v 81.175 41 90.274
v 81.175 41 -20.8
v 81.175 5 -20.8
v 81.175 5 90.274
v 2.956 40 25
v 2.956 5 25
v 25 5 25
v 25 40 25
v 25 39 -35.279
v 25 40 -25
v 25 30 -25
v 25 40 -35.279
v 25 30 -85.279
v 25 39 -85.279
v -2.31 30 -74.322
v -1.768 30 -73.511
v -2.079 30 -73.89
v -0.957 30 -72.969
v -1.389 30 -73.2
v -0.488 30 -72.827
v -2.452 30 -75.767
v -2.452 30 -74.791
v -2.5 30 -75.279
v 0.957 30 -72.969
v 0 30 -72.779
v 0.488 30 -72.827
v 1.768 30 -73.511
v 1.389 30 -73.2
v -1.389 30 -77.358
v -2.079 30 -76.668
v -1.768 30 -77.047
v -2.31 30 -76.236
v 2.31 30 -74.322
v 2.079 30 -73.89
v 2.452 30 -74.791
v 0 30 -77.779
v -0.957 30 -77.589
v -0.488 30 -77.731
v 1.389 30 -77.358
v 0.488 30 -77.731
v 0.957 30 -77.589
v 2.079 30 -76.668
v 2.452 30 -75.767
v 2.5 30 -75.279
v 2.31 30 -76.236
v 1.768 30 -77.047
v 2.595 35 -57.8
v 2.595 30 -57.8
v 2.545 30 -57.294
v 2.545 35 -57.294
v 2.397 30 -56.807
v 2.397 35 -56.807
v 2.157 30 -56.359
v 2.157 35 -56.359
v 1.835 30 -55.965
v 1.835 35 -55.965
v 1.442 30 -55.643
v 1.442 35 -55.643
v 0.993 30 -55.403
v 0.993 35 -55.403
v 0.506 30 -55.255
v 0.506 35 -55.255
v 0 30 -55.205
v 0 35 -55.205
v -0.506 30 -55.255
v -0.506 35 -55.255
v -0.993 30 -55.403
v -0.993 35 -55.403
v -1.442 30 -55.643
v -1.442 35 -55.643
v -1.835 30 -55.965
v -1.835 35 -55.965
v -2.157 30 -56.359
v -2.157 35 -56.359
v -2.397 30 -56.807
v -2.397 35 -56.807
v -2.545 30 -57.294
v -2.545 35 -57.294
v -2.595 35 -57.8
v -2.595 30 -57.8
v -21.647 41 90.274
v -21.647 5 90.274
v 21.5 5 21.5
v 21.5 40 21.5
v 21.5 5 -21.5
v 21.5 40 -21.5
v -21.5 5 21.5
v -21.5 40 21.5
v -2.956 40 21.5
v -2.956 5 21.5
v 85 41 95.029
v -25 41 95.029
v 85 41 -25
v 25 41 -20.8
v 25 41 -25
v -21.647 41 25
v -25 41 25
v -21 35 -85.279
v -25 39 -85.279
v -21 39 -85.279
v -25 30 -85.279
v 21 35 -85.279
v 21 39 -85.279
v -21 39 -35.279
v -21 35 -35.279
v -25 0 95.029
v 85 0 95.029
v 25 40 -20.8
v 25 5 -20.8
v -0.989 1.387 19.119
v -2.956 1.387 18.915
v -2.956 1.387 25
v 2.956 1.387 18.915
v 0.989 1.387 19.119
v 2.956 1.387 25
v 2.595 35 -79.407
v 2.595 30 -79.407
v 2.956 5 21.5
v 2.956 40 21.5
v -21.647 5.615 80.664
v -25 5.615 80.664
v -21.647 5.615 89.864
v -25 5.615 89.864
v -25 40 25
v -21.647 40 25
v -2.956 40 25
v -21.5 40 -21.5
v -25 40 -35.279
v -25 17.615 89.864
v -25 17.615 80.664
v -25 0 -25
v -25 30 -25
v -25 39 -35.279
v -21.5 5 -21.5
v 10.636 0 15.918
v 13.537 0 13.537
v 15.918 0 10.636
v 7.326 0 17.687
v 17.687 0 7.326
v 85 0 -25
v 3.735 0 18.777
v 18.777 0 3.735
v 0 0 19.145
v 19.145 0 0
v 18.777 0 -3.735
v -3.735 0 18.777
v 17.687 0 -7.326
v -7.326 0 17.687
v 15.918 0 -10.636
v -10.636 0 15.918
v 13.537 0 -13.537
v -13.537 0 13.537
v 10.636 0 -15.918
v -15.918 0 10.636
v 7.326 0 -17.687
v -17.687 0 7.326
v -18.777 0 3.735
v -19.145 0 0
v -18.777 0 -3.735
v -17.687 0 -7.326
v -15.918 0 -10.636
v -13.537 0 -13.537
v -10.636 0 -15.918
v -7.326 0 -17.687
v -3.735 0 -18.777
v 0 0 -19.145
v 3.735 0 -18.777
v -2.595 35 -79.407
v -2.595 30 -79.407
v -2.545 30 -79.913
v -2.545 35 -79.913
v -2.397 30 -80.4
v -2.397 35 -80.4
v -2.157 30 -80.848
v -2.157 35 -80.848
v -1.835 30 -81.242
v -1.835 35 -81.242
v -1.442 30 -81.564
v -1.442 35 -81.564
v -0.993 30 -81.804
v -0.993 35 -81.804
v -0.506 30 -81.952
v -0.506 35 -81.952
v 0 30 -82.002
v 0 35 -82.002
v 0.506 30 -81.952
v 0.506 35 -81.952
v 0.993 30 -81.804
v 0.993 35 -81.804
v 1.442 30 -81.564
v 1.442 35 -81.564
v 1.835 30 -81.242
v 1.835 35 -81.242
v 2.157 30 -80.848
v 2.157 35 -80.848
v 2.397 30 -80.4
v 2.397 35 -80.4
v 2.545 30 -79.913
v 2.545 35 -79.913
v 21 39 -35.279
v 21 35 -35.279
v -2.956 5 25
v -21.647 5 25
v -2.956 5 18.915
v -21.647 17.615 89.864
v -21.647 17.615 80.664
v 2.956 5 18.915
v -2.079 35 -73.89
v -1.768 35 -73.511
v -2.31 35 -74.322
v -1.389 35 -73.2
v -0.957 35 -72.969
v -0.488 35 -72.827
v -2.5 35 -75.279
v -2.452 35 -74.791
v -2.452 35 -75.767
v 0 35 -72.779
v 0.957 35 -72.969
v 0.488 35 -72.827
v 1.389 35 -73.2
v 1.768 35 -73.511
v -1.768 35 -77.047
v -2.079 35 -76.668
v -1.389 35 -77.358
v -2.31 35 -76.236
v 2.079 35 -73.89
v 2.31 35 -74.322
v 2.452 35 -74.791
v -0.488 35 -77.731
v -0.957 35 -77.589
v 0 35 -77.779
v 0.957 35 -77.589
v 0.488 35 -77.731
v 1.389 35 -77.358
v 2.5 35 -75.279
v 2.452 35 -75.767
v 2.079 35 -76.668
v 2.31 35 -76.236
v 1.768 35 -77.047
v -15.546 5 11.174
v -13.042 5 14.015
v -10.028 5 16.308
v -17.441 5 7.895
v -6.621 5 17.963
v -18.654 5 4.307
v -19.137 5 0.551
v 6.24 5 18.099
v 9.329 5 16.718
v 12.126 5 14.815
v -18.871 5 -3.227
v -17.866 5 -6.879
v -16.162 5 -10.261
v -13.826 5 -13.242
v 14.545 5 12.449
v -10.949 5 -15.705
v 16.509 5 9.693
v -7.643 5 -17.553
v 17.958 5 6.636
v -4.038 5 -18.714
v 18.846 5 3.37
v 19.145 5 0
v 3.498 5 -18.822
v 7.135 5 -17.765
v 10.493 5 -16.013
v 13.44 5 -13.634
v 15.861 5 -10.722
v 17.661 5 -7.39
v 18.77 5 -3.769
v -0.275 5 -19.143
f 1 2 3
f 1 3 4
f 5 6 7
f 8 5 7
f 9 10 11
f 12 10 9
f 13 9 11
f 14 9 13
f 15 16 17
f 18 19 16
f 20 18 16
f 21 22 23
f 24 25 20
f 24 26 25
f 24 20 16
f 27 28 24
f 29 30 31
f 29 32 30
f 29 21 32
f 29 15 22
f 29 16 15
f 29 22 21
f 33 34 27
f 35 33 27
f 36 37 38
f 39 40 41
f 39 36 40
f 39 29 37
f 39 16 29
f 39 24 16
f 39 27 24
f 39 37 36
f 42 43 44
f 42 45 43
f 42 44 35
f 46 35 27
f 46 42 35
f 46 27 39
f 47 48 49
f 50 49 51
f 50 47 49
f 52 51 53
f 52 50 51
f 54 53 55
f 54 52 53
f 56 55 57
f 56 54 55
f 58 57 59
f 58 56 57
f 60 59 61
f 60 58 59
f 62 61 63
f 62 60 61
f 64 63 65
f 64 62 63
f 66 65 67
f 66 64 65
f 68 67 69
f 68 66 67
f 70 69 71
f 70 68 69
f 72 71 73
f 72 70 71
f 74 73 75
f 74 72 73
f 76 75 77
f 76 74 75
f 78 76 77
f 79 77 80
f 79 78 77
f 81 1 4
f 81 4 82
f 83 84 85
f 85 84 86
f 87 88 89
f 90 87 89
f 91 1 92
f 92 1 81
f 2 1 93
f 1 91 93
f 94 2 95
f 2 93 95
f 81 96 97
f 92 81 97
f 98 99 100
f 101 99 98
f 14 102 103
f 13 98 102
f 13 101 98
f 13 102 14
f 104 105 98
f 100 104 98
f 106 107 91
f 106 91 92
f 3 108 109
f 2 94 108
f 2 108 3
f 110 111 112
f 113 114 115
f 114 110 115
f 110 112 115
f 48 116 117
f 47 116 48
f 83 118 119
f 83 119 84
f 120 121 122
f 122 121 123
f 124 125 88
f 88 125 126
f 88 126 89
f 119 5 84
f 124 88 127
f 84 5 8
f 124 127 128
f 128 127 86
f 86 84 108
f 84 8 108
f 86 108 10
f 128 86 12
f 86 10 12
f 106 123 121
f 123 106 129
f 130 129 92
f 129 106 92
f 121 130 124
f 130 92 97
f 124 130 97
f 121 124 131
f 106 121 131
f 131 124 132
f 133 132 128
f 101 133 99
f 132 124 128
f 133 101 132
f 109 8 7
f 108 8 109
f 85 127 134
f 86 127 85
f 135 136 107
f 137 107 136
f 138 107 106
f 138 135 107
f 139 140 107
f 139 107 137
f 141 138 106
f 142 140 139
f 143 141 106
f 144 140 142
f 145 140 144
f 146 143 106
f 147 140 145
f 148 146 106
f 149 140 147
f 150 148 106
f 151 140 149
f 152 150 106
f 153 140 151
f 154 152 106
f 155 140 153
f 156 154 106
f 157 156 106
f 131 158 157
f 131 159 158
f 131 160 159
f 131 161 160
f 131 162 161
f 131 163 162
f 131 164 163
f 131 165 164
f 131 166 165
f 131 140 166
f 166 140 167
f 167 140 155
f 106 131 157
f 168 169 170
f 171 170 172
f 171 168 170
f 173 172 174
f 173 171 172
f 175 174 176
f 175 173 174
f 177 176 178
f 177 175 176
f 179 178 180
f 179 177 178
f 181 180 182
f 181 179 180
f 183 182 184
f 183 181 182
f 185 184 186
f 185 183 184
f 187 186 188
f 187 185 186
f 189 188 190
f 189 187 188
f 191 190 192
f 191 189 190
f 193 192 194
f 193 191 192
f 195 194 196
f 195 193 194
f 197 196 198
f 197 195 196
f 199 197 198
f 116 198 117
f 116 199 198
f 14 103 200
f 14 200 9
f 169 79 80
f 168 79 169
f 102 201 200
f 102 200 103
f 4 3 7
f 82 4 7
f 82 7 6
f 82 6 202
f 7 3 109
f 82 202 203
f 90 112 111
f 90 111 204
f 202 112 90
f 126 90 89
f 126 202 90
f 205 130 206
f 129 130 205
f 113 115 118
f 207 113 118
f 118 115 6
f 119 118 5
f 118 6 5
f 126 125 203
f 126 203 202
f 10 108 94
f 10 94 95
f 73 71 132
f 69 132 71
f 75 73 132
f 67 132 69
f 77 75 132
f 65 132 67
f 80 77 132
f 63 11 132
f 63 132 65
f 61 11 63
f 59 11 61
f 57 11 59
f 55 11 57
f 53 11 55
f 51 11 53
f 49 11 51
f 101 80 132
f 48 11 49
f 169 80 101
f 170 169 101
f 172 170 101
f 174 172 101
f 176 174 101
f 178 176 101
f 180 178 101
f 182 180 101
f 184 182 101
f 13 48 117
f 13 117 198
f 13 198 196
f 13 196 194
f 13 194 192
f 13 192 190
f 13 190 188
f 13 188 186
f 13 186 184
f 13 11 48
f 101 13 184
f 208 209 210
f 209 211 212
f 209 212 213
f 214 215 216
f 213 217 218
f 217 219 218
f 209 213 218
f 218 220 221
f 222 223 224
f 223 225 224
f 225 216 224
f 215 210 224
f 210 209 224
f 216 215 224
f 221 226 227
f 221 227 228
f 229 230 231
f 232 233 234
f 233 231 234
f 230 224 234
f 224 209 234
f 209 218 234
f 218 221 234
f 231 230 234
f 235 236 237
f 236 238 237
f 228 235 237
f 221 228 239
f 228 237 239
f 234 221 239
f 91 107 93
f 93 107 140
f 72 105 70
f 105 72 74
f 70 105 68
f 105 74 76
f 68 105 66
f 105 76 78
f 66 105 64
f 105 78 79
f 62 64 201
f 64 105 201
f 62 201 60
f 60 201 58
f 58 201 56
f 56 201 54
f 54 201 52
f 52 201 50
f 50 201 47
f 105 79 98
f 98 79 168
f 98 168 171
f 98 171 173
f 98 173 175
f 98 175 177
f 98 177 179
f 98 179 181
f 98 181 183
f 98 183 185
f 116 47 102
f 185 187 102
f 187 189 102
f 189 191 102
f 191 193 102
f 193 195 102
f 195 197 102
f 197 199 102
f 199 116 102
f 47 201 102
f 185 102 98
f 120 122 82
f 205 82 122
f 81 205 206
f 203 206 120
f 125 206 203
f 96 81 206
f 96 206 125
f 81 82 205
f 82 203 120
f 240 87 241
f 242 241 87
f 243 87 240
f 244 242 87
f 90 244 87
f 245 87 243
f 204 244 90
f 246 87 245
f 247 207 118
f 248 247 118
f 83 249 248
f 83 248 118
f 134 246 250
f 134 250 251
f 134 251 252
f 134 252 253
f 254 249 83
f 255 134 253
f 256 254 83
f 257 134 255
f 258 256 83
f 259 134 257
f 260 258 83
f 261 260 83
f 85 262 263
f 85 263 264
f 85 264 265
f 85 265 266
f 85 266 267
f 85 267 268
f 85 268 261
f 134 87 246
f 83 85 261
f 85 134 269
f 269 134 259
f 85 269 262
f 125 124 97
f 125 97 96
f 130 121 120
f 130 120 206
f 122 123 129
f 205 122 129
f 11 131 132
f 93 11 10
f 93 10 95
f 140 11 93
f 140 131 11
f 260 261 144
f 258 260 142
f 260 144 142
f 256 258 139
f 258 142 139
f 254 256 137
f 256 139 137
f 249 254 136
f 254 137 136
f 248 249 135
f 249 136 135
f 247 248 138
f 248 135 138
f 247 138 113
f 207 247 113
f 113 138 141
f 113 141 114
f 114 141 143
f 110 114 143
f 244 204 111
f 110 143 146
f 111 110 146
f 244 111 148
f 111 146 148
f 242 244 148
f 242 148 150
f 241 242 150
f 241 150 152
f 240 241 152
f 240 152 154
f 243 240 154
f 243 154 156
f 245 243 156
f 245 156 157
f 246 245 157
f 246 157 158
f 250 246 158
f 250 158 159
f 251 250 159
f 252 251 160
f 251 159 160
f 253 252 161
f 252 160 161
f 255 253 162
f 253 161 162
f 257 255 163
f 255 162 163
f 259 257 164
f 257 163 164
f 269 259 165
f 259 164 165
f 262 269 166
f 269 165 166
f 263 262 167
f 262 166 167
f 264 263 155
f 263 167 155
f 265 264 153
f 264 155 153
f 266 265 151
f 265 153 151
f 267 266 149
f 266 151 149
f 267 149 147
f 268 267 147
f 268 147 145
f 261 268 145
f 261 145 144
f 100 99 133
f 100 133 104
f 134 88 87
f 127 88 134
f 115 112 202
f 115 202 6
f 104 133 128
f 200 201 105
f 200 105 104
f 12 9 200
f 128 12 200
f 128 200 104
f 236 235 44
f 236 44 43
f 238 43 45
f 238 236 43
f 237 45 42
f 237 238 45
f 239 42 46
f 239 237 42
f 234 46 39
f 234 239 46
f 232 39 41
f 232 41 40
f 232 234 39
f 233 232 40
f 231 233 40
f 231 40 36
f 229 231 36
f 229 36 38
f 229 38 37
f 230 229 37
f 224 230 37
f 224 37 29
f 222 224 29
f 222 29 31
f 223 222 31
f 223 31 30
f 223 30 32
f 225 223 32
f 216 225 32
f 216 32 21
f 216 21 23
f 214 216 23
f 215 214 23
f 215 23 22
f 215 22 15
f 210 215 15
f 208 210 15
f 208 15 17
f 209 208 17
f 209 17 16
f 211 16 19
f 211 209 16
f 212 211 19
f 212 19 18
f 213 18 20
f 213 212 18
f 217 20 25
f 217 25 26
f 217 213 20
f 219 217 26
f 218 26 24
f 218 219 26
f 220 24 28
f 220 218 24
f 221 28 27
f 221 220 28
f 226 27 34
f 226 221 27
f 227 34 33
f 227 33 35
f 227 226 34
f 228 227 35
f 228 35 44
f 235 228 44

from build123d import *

# Parameters (mm, degrees)
CROQUIS1_W                   = 50
CROQUIS1_H                   = 50
SALIENTE_EXTRUIR1_DEPTH      = 40
CROQUIS3_W                   = 43
CROQUIS3_H                   = 43
CORTAR_EXTRUIR3_DEPTH        = 35
CROQUIS5_W                   = 10.279142756
CROQUIS5_H                   = 10
SALIENTE_EXTRUIR2_DEPTH      = 25
SALIENTE_EXTRUIR2_DEPTH_BACK = 25
CROQUIS6_W                   = 50
CROQUIS6_H                   = 5
SALIENTE_EXTRUIR3_DEPTH      = 25
SALIENTE_EXTRUIR3_DEPTH_BACK = 25
CROQUIS7_W                   = 4
CROQUIS7_H                   = 50
SALIENTE_EXTRUIR4_DEPTH      = 4
CROQUIS8_R                   = 2.5
CORTAR_EXTRUIR5_DEPTH        = 4
CORTAR_EXTRUIR5_DEPTH_BACK   = 24
CROQUIS12_W                  = 5.911432894
CROQUIS12_H                  = 39.020469491
CORTAR_EXTRUIR7_DEPTH        = 10
CROQUIS13_R                  = 19.144660632
CORTAR_EXTRUIR8_DEPTH        = 10
SALIENTE_EXTRUIR6_DEPTH      = 41
CORTAR_EXTRUIR9_DEPTH        = 36
CROQUIS16_W                  = 9.2
CROQUIS16_H                  = 12
CORTAR_EXTRUIR10_DEPTH       = 36


with BuildPart() as part:
    # Croquis1 → Saliente-Extruir1 (new body)
    with BuildSketch(Plane(origin=(0, 0, 0), x_dir=(1, 0, 0), z_dir=(0, 1, 0))):
        Rectangle(CROQUIS1_W, CROQUIS1_H)
    extrude(amount=SALIENTE_EXTRUIR1_DEPTH)

    # Croquis3 → Cortar-Extruir3 (cut)
    with BuildSketch(Plane(origin=(0, 40, 0), x_dir=(1, 0, 0), z_dir=(0, 1, 0))):
        Rectangle(CROQUIS3_W, CROQUIS3_H)
    extrude(amount=-CORTAR_EXTRUIR3_DEPTH, mode=Mode.SUBTRACT)

    # Croquis5 → Saliente-Extruir2 (add, two sides)
    with BuildSketch(Plane(origin=(0, 0, 0), x_dir=(0, 0, -1), z_dir=(1, 0, 0))) as saliente_extruir2_sk:
        with Locations((30.139571378, 35)):
            Rectangle(CROQUIS5_W, CROQUIS5_H)
    extrude(amount=SALIENTE_EXTRUIR2_DEPTH)
    extrude(saliente_extruir2_sk.sketch, amount=-SALIENTE_EXTRUIR2_DEPTH_BACK)

    # Croquis6 → Saliente-Extruir3 (add, two sides)
    with BuildSketch(Plane(origin=(0, 0, 0), x_dir=(0, 0, -1), z_dir=(1, 0, 0))) as saliente_extruir3_sk:
        with Locations((60.279142756, 32.5)):
            Rectangle(CROQUIS6_W, CROQUIS6_H)
    extrude(amount=SALIENTE_EXTRUIR3_DEPTH)
    extrude(saliente_extruir3_sk.sketch, amount=-SALIENTE_EXTRUIR3_DEPTH_BACK)

    # Croquis7 → Saliente-Extruir4 (add)
    with BuildSketch(Plane(origin=(0, 35, 0), x_dir=(1, 0, 0), z_dir=(0, 1, 0))):
        with Locations((23, 60.279142756)):
            Rectangle(CROQUIS7_W, CROQUIS7_H)
        with Locations((-23, 60.279142756)):
            Rectangle(CROQUIS7_W, CROQUIS7_H)
    extrude(amount=SALIENTE_EXTRUIR4_DEPTH)

    # Croquis8 → Cortar-Extruir5 (cut, two sides)
    with BuildSketch(Plane(origin=(0, 35, 0), x_dir=(1, 0, 0), z_dir=(0, 1, 0))) as cortar_extruir5_sk:
        with BuildLine():
            Line((2.594795299, 79.406752636), (2.594795299, 57.800113609))
            ThreePointArc((2.594795299, 57.800113609), (0, 55.20531831), (-2.594795299, 57.800113609))
            Line((-2.594795299, 57.800113609), (-2.594795299, 79.406752636))
            ThreePointArc((-2.594795299, 79.406752636), (0, 82.001547935), (2.594795299, 79.406752636))
        make_face()
        with Locations((0, 75.279142756)):
            Circle(CROQUIS8_R, mode=Mode.SUBTRACT)
    extrude(amount=CORTAR_EXTRUIR5_DEPTH, mode=Mode.SUBTRACT)
    extrude(cortar_extruir5_sk.sketch, amount=-CORTAR_EXTRUIR5_DEPTH_BACK, mode=Mode.SUBTRACT)

    # Croquis12 → Cortar-Extruir7 (cut)
    with BuildSketch(Plane.XY.offset(25)):
        with Locations((0, 20.897214315)):
            Rectangle(CROQUIS12_W, CROQUIS12_H)
    extrude(amount=-CORTAR_EXTRUIR7_DEPTH, mode=Mode.SUBTRACT)

    # Croquis13 → Cortar-Extruir8 (cut)
    with BuildSketch(Plane.XZ):
        Circle(CROQUIS13_R)
    extrude(amount=-CORTAR_EXTRUIR8_DEPTH, mode=Mode.SUBTRACT)

    # Croquis14 → Saliente-Extruir6 (add)
    with BuildSketch(Plane(origin=(0, 0, 0), x_dir=(1, 0, 0), z_dir=(0, 1, 0))):
        Polygon((25, -25), (25, 25), (85, 25), (85, -25), (85, -95.028675022), (-25, -95.028675022), (-25, -25), align=None)
    extrude(amount=SALIENTE_EXTRUIR6_DEPTH)

    # Croquis15 → Cortar-Extruir9 (cut)
    with BuildSketch(Plane(origin=(0, 41, 0), x_dir=(1, 0, 0), z_dir=(0, 1, 0))):
        Polygon((25, 20.799862751), (81.174684786, 20.799862751), (81.174684786, -90.273805278), (-21.646948679, -90.273805278), (-21.646948679, -25), (25, -25), align=None)
    extrude(amount=-CORTAR_EXTRUIR9_DEPTH, mode=Mode.SUBTRACT)

    # Croquis16 → Cortar-Extruir10 (cut)
    with BuildSketch(Plane.ZY.offset(25)):
        with Locations((85.263986229, 11.614610625)):
            Rectangle(CROQUIS16_W, CROQUIS16_H)
    extrude(amount=-CORTAR_EXTRUIR10_DEPTH, mode=Mode.SUBTRACT)


solid = part.part
